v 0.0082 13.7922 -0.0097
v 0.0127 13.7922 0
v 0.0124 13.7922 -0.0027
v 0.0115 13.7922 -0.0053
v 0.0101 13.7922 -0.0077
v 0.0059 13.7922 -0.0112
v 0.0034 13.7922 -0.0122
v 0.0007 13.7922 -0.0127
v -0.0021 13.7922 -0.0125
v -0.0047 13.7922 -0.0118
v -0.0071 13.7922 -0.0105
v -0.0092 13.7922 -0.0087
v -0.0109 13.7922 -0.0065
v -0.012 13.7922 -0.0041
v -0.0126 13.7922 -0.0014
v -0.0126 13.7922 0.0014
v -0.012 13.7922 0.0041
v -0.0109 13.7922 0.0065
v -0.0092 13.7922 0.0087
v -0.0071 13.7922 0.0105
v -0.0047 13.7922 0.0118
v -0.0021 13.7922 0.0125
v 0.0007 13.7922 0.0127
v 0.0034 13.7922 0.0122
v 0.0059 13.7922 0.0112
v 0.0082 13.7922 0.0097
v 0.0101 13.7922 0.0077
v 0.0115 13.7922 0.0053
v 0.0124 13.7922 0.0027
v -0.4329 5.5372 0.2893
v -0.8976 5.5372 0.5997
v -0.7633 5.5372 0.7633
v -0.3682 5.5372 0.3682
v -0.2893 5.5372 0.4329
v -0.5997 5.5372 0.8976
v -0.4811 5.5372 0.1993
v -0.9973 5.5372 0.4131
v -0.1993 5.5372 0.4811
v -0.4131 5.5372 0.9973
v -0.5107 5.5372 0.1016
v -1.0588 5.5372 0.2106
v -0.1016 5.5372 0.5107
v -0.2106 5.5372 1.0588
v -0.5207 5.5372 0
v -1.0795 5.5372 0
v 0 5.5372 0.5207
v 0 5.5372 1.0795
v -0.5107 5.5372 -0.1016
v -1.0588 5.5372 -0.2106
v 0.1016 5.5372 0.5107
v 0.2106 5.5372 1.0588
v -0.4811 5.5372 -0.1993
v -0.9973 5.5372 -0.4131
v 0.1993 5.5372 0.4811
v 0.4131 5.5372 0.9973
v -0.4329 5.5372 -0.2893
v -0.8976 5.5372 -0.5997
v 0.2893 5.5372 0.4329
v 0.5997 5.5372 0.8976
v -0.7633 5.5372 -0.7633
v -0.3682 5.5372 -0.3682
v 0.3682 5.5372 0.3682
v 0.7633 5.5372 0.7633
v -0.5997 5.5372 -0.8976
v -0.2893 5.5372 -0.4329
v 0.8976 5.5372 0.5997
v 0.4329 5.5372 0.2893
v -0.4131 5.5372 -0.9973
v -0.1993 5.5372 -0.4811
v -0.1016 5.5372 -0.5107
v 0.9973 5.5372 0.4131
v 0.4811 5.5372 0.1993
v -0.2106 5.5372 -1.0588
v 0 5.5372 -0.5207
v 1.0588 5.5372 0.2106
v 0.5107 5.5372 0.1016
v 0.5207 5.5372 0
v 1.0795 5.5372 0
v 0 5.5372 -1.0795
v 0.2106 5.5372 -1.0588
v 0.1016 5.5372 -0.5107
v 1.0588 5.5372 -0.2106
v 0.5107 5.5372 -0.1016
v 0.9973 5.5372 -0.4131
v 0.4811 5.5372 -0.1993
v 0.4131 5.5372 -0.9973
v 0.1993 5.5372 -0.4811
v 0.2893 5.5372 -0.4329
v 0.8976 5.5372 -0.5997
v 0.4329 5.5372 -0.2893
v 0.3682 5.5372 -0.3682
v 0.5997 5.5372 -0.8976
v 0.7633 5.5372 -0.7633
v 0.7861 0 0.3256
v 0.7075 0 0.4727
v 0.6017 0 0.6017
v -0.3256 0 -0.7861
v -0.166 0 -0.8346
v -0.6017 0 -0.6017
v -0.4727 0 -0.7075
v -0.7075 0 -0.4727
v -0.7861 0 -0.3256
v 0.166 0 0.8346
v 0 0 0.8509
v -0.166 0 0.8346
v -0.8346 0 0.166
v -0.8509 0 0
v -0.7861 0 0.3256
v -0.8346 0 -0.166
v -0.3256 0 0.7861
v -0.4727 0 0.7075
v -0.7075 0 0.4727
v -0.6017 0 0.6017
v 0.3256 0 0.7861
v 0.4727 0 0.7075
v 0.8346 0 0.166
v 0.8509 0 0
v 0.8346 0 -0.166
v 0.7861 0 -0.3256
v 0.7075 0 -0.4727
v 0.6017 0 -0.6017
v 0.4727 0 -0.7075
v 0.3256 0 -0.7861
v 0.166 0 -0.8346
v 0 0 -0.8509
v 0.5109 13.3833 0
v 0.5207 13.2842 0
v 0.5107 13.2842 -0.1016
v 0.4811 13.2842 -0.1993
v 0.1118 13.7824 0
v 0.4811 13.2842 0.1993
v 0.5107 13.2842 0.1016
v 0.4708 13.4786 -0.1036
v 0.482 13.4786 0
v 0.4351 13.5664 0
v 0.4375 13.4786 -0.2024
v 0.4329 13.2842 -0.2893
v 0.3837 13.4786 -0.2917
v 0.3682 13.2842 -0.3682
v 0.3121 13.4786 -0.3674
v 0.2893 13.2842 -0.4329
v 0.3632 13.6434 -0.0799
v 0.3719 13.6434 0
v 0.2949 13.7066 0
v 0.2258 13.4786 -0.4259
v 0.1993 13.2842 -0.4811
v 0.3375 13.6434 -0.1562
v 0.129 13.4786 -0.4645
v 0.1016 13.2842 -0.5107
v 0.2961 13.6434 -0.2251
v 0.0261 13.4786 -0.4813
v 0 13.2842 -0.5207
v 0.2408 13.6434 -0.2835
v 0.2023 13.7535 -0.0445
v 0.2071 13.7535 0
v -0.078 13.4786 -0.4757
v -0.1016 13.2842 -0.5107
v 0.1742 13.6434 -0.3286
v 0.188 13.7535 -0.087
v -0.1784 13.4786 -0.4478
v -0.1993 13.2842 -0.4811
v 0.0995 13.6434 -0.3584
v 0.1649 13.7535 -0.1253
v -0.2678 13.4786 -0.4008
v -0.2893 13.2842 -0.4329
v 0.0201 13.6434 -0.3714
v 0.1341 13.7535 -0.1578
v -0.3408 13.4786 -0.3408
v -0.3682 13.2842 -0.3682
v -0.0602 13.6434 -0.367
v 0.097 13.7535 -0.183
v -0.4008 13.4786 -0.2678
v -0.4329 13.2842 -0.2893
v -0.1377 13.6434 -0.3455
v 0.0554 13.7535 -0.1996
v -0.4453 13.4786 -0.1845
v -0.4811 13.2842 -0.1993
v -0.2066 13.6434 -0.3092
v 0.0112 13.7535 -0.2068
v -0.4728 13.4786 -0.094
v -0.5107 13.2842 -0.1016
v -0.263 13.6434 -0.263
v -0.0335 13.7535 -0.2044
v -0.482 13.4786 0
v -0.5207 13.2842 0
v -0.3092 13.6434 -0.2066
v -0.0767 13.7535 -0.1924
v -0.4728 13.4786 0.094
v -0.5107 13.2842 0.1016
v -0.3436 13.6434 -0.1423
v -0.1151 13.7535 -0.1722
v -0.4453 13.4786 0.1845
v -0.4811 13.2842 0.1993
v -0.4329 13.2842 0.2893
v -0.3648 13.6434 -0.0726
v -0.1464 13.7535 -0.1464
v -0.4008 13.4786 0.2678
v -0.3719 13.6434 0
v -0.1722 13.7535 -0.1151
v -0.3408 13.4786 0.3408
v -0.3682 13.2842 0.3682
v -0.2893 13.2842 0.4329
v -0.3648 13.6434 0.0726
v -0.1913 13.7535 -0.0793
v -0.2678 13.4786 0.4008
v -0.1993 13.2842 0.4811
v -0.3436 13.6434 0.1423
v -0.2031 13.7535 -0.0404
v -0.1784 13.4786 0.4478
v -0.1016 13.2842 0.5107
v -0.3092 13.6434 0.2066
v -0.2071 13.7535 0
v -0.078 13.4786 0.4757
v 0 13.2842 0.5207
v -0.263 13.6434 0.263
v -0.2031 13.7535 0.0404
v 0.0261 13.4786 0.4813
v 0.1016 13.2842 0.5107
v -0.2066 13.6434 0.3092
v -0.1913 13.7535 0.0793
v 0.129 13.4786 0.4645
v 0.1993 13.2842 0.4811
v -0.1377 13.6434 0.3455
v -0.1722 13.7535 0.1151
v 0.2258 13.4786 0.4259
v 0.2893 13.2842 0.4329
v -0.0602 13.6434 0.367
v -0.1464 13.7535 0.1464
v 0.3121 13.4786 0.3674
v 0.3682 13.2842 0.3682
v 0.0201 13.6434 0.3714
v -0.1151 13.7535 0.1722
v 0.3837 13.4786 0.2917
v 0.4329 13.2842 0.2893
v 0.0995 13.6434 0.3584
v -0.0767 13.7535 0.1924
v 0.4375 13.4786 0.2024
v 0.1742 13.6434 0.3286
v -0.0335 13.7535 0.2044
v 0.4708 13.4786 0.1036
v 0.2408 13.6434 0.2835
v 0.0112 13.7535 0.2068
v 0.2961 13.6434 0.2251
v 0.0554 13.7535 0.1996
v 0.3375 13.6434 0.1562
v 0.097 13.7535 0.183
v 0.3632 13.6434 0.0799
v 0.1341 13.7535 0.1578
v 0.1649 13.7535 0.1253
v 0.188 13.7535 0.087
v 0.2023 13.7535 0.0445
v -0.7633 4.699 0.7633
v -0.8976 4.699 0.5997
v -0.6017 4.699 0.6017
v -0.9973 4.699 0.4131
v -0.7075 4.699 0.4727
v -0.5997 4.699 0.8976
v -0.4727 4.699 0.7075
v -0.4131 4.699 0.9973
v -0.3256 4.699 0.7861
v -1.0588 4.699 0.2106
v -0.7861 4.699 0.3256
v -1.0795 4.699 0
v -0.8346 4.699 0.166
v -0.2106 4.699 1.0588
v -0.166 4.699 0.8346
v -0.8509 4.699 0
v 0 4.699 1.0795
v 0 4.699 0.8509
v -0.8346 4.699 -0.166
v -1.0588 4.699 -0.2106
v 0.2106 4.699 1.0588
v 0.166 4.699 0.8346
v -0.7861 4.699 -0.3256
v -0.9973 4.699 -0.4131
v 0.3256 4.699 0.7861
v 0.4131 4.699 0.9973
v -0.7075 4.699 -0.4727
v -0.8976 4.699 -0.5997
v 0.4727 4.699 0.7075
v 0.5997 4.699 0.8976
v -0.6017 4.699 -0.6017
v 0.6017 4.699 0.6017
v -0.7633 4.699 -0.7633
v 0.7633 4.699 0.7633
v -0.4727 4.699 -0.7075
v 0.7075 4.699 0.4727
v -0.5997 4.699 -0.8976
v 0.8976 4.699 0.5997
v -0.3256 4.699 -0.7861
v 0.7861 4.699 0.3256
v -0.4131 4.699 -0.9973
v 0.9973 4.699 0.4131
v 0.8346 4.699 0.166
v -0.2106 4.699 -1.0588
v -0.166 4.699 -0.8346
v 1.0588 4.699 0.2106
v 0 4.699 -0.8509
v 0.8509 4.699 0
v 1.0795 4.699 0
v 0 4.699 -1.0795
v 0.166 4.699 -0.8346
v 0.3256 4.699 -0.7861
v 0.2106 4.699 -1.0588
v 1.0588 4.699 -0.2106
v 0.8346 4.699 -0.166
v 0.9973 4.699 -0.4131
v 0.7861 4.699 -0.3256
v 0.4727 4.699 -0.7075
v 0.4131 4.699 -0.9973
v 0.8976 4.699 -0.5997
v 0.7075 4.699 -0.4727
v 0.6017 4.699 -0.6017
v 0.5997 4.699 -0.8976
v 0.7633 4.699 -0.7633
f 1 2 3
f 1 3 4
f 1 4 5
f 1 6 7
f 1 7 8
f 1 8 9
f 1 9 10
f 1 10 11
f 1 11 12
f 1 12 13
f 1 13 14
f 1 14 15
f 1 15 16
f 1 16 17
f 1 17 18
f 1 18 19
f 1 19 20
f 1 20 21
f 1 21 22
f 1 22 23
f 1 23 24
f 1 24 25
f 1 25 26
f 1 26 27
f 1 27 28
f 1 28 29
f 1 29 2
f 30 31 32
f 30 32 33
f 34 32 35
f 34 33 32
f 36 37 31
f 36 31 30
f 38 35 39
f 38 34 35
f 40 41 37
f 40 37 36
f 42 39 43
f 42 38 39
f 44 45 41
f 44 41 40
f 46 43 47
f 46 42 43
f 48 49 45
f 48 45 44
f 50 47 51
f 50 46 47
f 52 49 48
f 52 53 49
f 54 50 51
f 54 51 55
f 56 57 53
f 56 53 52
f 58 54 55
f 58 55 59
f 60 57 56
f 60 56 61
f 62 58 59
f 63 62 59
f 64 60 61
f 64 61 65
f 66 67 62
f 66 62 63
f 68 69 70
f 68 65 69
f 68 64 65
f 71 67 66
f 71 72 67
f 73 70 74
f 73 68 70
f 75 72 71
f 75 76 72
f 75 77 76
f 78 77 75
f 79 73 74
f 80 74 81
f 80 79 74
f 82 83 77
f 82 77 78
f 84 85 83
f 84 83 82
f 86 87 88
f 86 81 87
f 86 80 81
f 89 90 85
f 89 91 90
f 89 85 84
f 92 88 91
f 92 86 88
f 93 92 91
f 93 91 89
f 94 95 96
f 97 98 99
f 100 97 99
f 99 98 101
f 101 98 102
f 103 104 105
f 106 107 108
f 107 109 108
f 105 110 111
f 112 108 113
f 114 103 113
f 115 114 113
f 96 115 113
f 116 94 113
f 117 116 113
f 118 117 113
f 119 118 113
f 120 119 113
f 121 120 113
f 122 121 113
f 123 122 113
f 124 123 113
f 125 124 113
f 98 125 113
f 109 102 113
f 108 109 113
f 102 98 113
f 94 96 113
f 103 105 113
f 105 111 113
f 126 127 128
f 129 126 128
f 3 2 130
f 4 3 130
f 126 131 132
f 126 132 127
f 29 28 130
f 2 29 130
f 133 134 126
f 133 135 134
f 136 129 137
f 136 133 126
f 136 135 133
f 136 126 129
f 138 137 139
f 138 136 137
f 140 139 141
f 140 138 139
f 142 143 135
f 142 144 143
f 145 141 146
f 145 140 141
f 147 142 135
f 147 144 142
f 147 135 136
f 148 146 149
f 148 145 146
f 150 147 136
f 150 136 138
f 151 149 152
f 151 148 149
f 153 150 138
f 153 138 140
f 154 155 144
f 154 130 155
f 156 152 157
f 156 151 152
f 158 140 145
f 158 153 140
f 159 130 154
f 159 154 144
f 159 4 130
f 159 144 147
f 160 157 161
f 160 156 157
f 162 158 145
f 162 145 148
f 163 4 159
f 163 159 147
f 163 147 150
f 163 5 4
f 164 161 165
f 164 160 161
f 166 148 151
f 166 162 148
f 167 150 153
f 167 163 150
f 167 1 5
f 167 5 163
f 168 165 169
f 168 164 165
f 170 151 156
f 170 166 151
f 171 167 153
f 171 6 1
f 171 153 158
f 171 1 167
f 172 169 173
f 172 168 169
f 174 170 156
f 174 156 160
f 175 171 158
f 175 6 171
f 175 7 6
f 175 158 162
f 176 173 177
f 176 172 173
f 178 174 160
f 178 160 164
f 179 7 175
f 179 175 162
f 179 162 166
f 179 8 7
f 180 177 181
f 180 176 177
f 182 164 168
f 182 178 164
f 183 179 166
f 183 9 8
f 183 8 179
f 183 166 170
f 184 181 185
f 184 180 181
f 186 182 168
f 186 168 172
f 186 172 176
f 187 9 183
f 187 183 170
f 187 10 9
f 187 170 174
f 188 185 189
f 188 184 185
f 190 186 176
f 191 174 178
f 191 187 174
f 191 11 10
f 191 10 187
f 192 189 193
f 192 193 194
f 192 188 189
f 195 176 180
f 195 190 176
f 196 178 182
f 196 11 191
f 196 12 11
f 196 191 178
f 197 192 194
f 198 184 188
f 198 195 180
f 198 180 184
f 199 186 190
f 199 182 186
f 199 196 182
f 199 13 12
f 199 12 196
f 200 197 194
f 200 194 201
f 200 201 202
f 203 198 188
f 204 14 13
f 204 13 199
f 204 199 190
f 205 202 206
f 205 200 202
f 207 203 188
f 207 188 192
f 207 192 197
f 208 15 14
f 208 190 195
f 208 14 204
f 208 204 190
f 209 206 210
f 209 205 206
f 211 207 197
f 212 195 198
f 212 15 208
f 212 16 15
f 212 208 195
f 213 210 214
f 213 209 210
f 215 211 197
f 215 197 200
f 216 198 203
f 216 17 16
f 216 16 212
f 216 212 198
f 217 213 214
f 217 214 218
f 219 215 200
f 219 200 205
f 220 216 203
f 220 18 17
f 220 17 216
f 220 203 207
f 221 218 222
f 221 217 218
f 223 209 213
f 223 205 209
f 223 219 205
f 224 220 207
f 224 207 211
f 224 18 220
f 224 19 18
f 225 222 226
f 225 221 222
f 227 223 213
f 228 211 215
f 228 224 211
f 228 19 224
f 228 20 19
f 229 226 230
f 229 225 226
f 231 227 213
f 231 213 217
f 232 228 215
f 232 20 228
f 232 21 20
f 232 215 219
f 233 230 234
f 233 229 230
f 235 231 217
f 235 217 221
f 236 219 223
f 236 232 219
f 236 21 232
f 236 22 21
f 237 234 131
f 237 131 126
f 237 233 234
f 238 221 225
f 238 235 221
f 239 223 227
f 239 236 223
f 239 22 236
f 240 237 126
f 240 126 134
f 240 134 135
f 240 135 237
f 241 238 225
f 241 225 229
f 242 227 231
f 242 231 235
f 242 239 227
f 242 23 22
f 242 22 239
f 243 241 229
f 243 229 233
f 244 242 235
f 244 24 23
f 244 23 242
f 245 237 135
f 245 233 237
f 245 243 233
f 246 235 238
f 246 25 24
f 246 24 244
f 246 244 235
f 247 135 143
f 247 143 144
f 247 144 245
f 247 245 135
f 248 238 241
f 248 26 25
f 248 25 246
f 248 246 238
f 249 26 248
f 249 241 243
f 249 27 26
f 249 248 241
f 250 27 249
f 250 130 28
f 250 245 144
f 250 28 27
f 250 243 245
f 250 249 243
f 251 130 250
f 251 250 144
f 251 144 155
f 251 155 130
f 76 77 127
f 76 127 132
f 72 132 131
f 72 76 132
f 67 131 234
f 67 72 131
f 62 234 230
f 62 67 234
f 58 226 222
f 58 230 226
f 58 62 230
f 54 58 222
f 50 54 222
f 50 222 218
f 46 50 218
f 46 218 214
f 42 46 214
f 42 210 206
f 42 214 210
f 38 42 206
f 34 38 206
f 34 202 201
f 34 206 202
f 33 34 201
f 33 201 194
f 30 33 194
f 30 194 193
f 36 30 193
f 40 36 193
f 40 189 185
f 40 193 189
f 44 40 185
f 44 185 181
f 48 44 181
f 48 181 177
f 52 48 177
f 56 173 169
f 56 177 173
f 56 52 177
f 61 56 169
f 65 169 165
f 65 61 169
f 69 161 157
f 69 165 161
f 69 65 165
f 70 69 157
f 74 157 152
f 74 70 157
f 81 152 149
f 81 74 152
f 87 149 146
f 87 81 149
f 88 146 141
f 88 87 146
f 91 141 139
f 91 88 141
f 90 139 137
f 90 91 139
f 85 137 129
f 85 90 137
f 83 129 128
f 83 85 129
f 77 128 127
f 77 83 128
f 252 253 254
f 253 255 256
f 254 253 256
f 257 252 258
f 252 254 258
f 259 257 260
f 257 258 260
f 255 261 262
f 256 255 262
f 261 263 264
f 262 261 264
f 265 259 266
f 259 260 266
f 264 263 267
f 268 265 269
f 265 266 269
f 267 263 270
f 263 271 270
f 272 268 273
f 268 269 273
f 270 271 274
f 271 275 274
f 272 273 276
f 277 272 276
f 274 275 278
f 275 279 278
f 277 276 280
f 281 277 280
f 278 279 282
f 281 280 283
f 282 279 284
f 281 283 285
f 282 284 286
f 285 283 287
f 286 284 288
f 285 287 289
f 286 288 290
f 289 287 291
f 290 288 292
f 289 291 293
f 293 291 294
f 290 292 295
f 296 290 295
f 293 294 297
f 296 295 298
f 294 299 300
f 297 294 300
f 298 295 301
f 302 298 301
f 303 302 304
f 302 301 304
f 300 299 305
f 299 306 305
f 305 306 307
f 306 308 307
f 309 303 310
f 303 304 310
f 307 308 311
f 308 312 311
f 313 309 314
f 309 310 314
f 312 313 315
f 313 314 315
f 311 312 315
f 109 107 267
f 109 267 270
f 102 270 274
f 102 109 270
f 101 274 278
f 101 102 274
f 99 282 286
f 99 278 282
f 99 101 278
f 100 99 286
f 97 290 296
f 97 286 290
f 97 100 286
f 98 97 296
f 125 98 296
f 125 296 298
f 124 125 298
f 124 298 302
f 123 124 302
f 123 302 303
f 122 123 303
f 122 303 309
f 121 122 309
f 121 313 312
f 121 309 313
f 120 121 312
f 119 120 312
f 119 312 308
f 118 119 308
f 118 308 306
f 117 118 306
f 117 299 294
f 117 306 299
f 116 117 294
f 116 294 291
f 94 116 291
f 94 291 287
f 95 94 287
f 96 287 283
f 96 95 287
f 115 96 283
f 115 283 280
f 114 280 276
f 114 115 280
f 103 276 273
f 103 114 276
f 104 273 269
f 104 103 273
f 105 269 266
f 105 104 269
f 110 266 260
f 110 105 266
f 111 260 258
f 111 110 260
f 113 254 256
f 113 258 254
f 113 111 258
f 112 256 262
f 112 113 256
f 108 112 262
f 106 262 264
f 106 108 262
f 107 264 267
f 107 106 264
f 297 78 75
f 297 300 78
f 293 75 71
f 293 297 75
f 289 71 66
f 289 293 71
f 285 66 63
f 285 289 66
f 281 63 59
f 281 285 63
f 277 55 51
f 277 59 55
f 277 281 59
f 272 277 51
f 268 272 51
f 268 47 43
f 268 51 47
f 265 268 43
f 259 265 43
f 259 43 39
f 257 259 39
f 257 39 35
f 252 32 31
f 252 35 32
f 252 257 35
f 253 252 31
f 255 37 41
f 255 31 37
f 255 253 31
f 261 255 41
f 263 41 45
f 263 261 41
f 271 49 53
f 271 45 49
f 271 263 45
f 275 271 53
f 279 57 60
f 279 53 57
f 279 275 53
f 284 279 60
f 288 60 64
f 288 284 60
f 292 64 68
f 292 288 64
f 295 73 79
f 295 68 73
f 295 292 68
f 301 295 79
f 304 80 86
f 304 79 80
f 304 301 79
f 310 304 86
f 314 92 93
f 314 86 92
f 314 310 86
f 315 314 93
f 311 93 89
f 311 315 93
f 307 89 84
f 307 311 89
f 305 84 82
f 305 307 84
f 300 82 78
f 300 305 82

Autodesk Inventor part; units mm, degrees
ref_plane "YZ Plane" through (0, 0, 0) normal (1, 0, 0) x (0, 1, 0)
ref_plane "XZ Plane" through (0, 0, 0) normal (0, 1, 0) x (-1, 0, 0)
ref_plane "XY Plane" through (0, 0, 0) normal (0, 0, 1) x (1, 0, 0)
sketch "Sketch1" plane through (0, 0, 0) normal (0, 1, 0) x (-1, 0, 0)
  circle A0 centre (0, 0) radius 0.8509
  dimension "d0" = 1.7018
extrude "Extrusion1" add sketch "Sketch1" along normal blind 4.699
sketch "Sketch2" plane through (0, 4.699, 0) normal (0, 1, 0) x (1, 0, 0)
  circle A0 centre (0, 0) radius 0.8509 projected
  circle A1 centre (0, 0) radius 1.0795
  dimension "d3" = 2.159
extrude "Extrusion2" add sketch "Sketch2" along normal blind 0.8382 contours A0 | A1
sketch "Sketch3" plane through (0, 5.5372, 0) normal (0, 1, 0) x (1, 0, 0)
  circle A0 centre (0, 0) radius 1.0795 projected
  circle A1 centre (0, 0) radius 0.5207
  dimension "d6" = 1.0414
extrude "Extrusion3" add sketch "Sketch3" along normal blind 8.255 contours A1
fillet "Fillet1" radius 0.508 1 edges at (-0.5207, 13.7922, 0)
properties part number "male_pin_component"
